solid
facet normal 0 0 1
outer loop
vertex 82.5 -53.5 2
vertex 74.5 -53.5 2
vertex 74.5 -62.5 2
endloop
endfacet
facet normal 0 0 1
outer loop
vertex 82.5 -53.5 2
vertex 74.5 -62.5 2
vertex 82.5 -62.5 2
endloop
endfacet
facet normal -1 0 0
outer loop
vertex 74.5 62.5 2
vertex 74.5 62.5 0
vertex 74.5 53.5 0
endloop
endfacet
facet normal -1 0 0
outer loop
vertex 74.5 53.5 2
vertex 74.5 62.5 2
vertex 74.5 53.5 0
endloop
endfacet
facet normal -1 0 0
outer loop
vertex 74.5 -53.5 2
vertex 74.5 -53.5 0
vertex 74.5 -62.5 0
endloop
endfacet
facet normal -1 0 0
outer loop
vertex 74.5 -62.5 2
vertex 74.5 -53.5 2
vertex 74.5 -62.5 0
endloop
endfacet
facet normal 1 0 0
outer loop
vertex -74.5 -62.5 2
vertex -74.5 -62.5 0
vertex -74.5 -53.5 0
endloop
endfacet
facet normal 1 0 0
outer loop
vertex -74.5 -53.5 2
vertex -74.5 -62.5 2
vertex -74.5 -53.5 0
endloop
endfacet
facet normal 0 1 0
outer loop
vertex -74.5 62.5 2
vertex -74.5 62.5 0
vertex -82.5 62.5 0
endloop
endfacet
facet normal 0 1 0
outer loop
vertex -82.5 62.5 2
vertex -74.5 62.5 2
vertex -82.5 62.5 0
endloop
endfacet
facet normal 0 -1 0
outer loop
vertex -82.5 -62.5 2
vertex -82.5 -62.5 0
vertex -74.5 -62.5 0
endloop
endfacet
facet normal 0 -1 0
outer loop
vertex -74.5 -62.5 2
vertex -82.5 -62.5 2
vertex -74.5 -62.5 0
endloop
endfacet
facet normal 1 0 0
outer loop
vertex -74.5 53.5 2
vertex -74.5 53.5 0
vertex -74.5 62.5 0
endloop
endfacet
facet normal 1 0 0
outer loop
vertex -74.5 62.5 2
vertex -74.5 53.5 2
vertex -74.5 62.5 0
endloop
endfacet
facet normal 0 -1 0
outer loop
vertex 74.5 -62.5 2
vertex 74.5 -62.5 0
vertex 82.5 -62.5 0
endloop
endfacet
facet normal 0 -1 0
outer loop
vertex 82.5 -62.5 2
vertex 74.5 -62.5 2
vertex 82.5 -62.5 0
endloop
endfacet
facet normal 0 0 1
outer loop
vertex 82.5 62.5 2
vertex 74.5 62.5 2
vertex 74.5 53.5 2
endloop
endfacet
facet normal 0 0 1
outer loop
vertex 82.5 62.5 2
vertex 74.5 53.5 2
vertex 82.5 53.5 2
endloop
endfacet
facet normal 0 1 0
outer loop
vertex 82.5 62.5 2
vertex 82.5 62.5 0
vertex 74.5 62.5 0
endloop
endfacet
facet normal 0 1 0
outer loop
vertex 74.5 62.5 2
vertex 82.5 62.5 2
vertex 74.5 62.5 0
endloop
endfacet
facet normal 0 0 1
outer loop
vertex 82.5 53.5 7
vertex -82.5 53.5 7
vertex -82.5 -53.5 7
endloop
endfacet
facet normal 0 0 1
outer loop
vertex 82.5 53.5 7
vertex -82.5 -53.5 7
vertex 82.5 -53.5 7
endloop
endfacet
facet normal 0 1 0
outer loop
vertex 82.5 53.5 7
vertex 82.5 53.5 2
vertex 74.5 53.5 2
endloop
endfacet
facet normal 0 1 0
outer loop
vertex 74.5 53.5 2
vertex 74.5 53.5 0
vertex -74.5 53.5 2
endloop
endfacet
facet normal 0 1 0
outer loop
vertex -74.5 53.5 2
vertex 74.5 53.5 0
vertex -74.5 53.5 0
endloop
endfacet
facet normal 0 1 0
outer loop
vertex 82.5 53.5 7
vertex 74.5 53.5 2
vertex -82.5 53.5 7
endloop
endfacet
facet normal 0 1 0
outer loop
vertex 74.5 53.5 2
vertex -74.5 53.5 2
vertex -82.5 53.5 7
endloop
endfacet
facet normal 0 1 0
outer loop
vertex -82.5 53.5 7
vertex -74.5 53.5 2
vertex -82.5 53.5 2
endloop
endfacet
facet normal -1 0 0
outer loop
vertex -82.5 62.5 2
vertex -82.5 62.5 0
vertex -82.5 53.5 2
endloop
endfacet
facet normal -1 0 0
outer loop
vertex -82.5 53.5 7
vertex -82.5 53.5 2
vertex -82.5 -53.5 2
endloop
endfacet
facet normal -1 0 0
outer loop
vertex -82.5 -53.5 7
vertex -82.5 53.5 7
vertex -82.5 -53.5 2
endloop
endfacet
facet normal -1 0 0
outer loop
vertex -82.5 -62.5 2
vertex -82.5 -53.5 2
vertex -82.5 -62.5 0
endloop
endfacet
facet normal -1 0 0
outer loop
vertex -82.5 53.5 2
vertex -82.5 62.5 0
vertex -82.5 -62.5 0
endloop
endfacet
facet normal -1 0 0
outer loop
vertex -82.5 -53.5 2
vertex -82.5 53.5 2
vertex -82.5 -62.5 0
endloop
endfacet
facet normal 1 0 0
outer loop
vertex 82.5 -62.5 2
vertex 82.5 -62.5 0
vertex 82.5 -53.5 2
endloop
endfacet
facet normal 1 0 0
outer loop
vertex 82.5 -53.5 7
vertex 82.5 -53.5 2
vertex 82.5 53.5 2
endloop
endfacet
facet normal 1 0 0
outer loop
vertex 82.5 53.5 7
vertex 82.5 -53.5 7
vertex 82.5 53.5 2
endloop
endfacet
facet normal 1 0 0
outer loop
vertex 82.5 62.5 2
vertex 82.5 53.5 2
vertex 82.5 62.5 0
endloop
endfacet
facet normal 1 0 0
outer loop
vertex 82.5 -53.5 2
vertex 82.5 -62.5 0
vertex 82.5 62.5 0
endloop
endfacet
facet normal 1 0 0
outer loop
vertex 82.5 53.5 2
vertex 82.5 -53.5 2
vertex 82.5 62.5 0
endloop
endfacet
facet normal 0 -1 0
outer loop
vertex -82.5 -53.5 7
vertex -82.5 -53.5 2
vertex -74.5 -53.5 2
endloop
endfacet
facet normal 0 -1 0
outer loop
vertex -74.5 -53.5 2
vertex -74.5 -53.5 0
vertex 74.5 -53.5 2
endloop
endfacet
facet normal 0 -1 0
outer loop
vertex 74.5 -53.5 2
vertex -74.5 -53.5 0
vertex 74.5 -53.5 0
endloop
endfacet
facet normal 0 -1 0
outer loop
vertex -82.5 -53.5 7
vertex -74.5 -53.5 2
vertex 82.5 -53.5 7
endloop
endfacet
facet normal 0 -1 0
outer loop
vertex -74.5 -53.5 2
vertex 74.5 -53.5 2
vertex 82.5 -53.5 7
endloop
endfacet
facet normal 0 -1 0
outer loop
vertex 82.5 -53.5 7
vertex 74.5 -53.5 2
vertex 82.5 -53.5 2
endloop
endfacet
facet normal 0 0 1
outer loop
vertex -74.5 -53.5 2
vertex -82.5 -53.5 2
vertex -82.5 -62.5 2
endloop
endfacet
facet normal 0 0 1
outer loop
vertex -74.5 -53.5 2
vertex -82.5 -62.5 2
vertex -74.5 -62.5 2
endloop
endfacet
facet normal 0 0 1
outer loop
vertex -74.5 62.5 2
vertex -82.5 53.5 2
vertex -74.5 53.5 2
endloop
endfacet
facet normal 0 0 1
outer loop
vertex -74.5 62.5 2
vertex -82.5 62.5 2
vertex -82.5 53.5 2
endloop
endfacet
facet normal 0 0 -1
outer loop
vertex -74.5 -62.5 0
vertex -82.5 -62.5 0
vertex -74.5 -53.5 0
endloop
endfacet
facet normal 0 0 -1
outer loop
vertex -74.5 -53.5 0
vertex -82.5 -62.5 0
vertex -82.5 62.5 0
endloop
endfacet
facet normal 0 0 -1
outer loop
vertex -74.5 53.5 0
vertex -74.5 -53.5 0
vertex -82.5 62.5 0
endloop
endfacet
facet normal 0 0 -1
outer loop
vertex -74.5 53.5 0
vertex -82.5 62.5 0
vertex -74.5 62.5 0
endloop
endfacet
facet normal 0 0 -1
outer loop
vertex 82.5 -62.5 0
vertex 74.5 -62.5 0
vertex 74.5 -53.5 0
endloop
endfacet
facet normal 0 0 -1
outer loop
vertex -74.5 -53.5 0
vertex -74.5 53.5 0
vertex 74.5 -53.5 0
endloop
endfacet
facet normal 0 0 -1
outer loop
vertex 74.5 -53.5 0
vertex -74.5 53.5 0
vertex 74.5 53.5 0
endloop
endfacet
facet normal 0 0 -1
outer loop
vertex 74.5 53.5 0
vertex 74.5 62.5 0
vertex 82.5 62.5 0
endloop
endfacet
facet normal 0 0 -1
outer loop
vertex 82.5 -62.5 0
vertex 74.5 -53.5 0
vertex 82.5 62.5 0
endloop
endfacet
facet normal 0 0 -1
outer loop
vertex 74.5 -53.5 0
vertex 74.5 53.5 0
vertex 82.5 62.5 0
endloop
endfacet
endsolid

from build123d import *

# Parameters (mm, degrees)
F1_DEPTH = 2
F3_DEPTH = 5


with BuildPart() as f1:
    # F0 (on Top) → F1 (new body)
    with BuildSketch(Plane.XY):
        Polygon((82.5, 53.5), (82.5, 62.5), (74.5, 62.5), (74.5, 53.5), (-74.5, 53.5), (-74.5, 62.5), (-82.5, 62.5), (-82.5, 53.5), (-82.5, -53.5), (-82.5, -62.5), (-74.5, -62.5), (-74.5, -53.5), (74.5, -53.5), (74.5, -62.5), (82.5, -62.5), (82.5, -53.5), align=None)
    extrude(amount=F1_DEPTH)

    # F2 (on face) → F3 (join)
    with BuildSketch(Plane.XY.offset(2)):
        Polygon((82.5, -53.5), (82.5, 53.5), (74.5, 53.5), (-74.5, 53.5), (-82.5, 53.5), (-82.5, -53.5), (-74.5, -53.5), (74.5, -53.5), align=None)
    extrude(amount=F3_DEPTH)


solid = f1.part
